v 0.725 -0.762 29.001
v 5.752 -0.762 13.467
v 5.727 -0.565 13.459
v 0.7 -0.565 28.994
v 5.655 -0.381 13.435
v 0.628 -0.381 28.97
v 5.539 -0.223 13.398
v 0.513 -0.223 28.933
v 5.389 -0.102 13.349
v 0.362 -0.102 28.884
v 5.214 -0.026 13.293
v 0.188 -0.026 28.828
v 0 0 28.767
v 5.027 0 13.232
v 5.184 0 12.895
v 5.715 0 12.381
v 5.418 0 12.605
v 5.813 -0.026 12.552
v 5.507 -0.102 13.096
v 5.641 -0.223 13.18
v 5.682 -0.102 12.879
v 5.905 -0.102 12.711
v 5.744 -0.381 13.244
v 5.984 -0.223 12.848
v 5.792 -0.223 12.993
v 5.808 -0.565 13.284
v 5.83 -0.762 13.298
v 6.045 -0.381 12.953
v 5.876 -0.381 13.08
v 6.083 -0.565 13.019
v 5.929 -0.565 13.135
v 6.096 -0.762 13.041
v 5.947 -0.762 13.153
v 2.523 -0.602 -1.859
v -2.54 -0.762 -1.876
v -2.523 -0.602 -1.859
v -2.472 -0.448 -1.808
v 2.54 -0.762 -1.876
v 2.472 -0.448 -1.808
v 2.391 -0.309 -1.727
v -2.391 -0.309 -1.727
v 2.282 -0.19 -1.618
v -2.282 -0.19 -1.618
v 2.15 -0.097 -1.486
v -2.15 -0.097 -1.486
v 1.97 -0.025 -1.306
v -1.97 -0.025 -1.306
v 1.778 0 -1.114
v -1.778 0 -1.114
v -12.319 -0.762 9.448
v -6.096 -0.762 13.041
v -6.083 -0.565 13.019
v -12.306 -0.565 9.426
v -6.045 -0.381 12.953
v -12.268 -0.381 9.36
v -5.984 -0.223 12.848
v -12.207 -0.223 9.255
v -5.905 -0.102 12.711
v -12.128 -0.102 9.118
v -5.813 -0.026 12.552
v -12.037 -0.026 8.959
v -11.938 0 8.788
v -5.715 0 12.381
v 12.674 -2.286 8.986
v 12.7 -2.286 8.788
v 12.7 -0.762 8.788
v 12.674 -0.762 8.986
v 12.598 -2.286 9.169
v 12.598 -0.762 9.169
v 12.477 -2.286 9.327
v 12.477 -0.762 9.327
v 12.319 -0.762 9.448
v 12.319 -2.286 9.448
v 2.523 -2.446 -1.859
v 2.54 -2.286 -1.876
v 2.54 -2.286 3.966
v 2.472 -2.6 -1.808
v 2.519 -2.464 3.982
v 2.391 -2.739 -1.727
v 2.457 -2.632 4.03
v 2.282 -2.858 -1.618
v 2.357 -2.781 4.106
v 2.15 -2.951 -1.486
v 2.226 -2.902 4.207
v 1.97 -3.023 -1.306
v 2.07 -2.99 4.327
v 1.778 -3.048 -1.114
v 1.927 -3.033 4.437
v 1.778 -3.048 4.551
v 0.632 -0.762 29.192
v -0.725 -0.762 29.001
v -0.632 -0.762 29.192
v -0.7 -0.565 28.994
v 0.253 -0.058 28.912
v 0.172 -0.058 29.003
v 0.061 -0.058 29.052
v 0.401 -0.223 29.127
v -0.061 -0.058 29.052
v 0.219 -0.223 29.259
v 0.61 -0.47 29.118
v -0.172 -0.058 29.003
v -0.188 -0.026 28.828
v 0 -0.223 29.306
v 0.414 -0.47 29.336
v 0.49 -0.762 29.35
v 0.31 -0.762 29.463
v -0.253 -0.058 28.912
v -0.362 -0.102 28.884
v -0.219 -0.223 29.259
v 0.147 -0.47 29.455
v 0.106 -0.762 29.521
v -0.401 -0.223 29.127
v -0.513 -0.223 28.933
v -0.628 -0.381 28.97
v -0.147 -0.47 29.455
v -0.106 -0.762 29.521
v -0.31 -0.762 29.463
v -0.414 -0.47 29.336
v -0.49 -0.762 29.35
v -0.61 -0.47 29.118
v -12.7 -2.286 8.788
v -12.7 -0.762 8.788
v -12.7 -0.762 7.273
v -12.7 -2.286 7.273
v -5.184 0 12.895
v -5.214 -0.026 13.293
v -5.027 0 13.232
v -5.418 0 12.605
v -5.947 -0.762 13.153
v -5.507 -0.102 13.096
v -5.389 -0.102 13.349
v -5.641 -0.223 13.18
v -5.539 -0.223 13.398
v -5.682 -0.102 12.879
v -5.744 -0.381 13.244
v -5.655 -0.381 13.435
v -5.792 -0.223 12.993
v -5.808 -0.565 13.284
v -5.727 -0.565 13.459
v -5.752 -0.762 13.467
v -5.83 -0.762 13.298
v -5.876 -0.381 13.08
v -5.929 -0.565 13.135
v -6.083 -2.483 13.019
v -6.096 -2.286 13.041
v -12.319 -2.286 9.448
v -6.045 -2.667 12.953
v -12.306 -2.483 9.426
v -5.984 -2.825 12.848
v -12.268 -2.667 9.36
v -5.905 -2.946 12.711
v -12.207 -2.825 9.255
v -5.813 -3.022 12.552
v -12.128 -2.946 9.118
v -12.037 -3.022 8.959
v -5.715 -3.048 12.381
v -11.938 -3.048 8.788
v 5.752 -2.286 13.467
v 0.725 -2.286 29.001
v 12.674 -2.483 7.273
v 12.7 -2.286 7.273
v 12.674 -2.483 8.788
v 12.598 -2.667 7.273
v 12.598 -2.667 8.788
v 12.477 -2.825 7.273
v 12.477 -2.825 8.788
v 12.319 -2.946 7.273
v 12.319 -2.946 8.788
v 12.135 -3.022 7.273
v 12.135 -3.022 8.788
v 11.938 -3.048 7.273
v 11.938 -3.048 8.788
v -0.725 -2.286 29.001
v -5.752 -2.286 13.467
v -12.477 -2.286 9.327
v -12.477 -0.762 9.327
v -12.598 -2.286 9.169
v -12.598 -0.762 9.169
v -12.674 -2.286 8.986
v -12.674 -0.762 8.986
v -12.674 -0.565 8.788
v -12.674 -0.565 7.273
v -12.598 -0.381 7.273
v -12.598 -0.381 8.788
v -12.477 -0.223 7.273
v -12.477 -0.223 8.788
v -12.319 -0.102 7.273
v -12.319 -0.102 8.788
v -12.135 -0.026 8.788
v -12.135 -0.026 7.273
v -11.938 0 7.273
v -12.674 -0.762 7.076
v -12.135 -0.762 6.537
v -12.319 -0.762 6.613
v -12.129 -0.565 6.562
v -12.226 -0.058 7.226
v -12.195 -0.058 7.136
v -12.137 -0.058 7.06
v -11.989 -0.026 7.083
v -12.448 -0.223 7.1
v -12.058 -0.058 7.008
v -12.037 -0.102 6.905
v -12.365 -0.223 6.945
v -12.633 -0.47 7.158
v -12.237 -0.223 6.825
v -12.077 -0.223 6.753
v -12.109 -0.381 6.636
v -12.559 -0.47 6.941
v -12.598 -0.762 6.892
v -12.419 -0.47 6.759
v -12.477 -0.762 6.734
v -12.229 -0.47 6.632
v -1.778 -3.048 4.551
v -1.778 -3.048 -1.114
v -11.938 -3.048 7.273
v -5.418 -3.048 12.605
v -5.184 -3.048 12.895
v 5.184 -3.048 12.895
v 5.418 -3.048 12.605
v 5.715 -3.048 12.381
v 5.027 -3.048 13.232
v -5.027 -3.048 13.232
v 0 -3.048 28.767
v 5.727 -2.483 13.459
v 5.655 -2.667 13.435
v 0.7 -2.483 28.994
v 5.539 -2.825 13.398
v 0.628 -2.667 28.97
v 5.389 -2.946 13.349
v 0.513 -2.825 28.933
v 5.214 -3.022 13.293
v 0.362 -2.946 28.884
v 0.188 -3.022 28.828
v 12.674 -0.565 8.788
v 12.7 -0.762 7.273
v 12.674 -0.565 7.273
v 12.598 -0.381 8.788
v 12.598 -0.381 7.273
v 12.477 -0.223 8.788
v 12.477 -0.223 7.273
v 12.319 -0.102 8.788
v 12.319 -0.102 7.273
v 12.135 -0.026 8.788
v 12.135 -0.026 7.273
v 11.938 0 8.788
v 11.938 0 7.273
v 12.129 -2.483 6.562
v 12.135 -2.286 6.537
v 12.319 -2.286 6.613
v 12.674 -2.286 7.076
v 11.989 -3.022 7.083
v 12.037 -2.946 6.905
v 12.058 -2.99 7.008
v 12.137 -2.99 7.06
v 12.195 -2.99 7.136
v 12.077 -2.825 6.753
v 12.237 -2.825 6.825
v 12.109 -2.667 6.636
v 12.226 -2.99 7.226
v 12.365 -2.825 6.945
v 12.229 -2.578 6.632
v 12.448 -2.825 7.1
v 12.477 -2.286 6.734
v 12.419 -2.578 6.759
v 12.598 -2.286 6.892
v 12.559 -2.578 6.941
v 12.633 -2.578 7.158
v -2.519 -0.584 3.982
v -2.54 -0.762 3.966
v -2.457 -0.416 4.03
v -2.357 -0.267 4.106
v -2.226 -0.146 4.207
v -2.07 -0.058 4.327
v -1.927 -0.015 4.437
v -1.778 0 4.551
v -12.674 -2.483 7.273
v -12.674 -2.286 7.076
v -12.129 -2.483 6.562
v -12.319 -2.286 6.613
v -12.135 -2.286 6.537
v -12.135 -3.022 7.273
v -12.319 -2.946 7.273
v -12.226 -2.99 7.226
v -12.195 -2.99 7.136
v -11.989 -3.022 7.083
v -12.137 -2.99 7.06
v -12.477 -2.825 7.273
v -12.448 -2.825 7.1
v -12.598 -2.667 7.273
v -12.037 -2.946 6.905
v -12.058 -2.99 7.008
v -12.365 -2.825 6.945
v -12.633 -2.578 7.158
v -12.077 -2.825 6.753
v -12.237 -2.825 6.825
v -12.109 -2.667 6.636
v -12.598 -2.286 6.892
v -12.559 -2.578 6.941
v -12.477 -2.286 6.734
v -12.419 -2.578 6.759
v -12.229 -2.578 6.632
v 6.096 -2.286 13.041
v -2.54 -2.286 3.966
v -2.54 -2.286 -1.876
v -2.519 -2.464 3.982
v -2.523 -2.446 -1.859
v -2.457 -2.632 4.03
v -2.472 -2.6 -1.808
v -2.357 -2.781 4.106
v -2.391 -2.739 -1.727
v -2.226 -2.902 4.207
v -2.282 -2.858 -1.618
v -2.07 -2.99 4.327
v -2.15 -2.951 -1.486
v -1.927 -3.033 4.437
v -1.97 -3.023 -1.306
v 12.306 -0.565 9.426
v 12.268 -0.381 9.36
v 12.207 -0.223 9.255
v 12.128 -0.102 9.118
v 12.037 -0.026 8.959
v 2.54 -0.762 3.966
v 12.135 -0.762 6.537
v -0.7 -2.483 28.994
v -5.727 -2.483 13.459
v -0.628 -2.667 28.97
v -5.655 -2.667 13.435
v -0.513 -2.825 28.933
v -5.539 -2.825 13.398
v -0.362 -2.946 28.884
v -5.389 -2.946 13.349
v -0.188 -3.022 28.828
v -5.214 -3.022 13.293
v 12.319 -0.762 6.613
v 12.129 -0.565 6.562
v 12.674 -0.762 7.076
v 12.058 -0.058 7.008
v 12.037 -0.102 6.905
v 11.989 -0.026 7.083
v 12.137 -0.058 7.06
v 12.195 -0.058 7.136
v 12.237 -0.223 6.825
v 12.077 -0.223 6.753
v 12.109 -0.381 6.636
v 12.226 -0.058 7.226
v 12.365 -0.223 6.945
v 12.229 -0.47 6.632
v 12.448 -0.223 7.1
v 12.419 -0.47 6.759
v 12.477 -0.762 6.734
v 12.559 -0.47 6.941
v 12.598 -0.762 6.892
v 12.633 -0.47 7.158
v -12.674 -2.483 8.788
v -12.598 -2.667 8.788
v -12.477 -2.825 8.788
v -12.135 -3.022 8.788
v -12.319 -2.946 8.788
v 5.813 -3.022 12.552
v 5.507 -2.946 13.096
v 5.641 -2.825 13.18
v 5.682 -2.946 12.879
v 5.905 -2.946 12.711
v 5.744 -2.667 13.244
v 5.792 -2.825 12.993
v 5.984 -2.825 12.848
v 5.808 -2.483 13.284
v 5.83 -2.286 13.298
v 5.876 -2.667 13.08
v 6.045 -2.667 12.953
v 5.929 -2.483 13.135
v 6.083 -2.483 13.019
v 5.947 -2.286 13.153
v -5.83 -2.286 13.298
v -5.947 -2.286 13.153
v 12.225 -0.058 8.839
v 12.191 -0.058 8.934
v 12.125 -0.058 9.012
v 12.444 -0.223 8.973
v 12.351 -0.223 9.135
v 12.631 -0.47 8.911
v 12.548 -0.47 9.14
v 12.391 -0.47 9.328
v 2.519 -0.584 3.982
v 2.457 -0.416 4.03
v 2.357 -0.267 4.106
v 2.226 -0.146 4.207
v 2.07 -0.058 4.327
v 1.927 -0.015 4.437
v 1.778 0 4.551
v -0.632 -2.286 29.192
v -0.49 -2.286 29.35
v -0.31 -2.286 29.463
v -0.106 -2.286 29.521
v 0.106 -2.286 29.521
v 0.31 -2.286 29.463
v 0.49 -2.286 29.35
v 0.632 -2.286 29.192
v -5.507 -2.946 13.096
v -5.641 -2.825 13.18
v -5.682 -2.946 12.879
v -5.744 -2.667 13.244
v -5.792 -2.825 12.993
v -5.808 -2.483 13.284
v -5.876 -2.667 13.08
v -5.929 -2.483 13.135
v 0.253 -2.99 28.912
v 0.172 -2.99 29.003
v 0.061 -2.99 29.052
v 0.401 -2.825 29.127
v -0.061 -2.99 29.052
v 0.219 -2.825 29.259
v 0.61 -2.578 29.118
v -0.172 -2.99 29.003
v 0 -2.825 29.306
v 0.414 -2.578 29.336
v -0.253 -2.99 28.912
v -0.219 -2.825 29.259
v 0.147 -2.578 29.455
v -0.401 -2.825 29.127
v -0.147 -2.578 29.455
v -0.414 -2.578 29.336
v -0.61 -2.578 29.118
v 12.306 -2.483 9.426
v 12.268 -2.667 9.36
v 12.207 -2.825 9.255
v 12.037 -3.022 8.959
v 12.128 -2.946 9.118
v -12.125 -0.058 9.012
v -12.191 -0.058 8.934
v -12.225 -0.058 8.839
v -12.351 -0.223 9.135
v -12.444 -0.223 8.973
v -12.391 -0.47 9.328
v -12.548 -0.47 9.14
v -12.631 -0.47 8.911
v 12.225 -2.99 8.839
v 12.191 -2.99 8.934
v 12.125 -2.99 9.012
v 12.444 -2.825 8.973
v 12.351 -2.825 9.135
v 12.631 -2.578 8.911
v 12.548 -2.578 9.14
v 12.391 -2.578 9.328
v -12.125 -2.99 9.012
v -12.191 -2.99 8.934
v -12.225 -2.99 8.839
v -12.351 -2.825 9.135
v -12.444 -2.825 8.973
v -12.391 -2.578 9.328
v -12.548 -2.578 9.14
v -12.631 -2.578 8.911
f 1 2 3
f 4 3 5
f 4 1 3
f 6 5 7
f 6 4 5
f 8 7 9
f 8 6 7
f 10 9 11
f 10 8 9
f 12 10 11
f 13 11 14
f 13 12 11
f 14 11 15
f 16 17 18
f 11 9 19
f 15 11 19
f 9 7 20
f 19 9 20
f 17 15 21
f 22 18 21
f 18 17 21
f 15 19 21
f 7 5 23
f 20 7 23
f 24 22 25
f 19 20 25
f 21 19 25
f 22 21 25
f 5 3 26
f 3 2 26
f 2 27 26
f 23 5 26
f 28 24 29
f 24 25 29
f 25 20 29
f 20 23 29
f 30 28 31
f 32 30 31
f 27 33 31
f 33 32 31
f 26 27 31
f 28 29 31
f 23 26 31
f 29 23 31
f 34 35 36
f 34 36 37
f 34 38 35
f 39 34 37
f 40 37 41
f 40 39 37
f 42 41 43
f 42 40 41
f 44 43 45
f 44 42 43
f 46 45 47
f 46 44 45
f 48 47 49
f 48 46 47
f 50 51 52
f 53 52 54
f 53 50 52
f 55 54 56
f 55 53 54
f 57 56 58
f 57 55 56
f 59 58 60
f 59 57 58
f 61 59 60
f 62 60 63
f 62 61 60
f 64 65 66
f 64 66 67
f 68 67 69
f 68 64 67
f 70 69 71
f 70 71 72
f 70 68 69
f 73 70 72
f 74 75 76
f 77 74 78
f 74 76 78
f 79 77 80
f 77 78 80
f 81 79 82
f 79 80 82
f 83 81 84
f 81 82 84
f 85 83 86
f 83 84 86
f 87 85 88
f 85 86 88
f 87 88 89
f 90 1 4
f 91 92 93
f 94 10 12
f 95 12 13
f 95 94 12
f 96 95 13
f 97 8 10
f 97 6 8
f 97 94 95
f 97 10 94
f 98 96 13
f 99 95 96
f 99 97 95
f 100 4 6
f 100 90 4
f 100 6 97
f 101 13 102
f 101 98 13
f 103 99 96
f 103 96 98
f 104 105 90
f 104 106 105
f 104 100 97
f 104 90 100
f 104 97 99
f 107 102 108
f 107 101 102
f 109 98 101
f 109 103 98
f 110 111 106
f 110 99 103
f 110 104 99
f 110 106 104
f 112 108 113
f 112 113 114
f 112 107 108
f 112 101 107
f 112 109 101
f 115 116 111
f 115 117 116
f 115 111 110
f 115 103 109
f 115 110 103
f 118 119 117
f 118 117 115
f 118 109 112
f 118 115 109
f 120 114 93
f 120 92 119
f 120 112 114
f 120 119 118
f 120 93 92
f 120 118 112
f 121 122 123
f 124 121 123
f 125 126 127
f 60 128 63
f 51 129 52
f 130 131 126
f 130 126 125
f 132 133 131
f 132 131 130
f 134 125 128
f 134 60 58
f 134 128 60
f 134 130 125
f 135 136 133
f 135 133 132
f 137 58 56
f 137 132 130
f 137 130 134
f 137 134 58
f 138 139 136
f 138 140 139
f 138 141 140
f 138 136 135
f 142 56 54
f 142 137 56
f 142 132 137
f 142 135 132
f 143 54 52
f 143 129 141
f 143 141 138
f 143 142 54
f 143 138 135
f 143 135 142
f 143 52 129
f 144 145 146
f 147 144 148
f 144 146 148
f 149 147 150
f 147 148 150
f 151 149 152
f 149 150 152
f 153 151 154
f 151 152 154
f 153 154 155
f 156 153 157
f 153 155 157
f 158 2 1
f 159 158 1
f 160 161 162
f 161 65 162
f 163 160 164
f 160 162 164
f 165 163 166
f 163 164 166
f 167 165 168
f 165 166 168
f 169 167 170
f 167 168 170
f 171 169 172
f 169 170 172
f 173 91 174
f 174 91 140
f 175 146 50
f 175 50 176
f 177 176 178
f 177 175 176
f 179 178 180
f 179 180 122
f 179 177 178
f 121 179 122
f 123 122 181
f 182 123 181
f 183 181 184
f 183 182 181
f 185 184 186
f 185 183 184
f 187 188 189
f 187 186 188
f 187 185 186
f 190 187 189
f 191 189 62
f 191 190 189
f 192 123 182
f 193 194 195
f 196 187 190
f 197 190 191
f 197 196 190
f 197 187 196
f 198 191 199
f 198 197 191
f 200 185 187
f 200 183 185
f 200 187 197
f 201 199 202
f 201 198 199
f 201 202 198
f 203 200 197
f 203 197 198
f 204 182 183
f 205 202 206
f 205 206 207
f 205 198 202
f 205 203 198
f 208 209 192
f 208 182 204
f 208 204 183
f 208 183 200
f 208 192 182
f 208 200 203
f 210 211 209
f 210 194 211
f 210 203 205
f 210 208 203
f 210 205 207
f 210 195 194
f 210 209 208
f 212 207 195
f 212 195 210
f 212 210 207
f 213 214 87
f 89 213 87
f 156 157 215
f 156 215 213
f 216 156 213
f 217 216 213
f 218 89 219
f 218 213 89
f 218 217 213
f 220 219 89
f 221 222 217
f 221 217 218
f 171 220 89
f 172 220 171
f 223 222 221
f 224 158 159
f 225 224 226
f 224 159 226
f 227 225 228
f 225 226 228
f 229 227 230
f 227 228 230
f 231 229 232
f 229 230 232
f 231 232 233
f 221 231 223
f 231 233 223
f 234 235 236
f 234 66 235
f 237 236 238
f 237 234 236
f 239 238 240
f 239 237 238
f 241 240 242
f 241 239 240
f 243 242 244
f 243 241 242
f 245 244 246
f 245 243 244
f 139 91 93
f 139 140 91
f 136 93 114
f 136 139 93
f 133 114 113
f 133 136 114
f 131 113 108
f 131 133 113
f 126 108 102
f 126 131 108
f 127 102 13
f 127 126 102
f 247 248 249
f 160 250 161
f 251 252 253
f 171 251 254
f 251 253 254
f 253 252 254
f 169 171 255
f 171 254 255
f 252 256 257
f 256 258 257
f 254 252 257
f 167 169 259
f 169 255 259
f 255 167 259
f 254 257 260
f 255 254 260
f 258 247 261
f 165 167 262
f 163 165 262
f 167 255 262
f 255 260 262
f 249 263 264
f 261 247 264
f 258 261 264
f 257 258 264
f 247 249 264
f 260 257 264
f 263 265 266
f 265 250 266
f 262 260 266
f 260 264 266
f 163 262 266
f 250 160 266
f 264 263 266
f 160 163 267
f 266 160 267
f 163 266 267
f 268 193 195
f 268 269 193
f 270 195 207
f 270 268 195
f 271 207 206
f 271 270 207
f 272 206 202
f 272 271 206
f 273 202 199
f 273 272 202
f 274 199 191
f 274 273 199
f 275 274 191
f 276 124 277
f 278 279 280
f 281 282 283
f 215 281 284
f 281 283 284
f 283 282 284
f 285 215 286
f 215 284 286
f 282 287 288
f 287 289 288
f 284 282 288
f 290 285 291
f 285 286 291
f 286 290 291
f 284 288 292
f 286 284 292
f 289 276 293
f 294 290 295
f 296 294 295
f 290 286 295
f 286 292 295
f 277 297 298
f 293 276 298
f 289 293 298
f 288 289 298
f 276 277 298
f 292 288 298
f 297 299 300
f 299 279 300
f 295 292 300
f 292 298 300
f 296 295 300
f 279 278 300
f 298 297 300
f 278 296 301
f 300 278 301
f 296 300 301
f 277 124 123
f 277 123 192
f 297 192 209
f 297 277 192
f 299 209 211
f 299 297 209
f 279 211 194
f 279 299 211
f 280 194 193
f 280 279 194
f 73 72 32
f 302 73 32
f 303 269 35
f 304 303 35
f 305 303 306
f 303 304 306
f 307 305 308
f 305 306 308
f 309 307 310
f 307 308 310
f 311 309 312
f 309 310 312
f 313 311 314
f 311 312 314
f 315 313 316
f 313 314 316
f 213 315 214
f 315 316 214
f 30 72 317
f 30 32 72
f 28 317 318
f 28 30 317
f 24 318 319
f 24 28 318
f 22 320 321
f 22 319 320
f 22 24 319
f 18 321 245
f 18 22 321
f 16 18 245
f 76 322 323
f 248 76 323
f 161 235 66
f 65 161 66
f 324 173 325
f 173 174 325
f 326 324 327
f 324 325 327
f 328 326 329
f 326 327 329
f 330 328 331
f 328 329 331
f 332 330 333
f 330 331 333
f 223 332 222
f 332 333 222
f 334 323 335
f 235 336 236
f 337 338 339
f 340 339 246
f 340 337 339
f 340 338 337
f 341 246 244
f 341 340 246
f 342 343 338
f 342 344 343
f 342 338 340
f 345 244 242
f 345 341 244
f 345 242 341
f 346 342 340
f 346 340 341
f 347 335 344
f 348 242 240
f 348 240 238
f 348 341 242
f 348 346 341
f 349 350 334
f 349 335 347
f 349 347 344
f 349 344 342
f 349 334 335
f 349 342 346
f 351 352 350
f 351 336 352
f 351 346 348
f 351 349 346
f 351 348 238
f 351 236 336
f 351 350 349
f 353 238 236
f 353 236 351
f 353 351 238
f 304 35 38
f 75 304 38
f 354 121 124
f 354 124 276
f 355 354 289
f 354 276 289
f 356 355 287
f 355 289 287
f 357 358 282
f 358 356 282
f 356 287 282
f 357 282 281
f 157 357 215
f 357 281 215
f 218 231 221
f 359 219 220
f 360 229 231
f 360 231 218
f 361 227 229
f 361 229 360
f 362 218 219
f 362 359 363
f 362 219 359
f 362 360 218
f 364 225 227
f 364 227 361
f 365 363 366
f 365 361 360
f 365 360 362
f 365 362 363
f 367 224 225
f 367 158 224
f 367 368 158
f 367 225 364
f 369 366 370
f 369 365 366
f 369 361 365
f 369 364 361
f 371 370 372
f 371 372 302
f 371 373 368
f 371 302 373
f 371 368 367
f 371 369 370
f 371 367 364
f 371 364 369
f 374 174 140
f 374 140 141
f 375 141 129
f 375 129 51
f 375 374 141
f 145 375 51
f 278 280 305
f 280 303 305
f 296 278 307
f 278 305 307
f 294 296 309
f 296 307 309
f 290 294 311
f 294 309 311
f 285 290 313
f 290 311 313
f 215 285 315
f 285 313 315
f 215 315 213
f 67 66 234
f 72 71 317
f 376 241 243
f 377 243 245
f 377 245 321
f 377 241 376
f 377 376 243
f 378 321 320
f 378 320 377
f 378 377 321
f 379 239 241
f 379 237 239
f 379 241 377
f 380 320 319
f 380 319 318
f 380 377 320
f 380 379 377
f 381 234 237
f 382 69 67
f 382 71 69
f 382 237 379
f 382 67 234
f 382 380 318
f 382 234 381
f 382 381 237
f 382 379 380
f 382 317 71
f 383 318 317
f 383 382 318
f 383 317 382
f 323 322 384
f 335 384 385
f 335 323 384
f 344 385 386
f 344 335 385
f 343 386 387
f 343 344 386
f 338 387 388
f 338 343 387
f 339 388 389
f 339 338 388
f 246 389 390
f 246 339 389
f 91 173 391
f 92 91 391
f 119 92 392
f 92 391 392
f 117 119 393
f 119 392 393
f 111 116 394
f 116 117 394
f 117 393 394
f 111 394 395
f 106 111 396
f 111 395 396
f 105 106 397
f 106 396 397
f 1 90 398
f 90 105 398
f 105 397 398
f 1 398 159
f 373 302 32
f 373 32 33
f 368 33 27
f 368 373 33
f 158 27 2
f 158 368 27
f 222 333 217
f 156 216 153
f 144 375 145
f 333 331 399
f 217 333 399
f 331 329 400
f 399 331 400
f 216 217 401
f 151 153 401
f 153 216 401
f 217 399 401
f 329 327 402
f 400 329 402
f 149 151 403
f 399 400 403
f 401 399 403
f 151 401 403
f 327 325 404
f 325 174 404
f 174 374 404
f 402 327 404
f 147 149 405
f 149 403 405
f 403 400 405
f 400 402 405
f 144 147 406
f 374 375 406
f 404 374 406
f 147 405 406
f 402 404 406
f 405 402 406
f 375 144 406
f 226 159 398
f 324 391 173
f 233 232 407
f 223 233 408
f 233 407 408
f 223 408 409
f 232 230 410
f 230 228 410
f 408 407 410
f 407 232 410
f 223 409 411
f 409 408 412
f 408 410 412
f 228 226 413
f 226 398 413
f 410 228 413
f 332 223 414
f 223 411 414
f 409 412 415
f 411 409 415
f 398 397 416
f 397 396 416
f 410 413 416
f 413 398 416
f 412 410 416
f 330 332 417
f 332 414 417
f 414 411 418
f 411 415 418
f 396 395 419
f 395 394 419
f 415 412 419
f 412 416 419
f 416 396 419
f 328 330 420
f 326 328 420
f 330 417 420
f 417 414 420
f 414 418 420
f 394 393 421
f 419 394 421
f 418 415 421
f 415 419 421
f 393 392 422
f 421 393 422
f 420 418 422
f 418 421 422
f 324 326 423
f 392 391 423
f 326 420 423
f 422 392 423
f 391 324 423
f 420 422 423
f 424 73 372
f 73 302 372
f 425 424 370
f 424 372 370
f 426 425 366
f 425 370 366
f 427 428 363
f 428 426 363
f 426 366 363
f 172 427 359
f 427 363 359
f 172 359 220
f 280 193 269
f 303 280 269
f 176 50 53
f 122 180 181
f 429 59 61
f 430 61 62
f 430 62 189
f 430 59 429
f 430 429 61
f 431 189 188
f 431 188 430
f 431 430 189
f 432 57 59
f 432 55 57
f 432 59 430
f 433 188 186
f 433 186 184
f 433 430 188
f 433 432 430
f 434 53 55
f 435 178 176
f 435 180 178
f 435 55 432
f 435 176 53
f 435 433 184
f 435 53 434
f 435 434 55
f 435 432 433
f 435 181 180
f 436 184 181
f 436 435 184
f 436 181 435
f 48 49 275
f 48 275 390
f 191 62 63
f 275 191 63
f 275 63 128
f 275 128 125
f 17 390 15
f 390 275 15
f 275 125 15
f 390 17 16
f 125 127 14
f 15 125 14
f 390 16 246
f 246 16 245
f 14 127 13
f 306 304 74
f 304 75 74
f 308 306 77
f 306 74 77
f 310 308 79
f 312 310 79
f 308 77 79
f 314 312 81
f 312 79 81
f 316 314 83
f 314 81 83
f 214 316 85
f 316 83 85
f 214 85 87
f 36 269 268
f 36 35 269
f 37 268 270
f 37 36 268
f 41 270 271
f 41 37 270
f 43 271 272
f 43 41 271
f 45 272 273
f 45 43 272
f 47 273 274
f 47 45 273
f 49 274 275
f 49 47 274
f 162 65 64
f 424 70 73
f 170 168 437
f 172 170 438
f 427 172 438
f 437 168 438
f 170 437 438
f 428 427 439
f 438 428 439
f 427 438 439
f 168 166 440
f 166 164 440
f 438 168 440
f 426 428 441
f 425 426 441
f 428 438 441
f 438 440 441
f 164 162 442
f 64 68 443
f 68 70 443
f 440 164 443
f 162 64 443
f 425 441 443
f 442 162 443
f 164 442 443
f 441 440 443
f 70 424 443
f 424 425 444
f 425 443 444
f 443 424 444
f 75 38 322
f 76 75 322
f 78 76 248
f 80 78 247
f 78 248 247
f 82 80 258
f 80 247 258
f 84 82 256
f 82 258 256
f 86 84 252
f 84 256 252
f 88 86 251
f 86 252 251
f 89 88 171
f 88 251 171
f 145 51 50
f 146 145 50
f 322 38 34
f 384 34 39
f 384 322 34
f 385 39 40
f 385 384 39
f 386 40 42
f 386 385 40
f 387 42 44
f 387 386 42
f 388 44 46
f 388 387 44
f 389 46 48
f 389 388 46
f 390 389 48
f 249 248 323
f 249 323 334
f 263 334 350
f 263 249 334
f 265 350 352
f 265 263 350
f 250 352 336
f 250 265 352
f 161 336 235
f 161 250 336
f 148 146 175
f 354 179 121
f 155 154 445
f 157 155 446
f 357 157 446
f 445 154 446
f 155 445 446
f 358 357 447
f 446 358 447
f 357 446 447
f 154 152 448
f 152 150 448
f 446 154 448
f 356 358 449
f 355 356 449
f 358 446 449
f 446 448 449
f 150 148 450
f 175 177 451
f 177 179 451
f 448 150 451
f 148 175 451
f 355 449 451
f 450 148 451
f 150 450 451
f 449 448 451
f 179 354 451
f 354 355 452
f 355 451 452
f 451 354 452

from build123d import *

# Parameters (mm, degrees)
F1_DEPTH = 3.048
F2_R     = 0.762


with BuildPart() as f1:
    # F0 (on Front) → F1 (new body)
    with BuildSketch(Plane.XZ):
        Polygon((0, 31.242), (-5.842, 13.187891), (-12.7, 9.228423), (-12.7, 6.688423), (-2.54, 3.966059), (-2.54, -1.875941), (2.54, -1.875941), (2.54, 3.966059), (12.7, 6.688423), (12.7, 9.228423), (5.842, 13.187891), align=None)
    extrude(amount=F1_DEPTH)

    # F2
    f2_edges = [f1.edges().sort_by_distance(p)[0] for p in [
        (0, -1.524, 31.242),
        (5.842, -1.524, 13.187891),
        (12.7, -1.524, 9.228423),
        (12.7, -1.524, 6.688423),
        (-5.842, -1.524, 13.187891),
        (-12.7, -1.524, 9.228423),
        (-12.7, -1.524, 6.688423),
        (2.54, 0, 1.045059),
        (2.54, -3.048, 1.045059),
        (-2.54, -3.048, 1.045059),
        (-2.54, 0, 1.045059),
        (2.921, -3.048, 22.214946),
        (-2.921, -3.048, 22.214946),
        (-9.271, -3.048, 11.208157),
        (-12.7, -3.048, 7.958423),
        (-7.62, -3.048, 5.327241),
        (0, -3.048, -1.875941),
        (7.62, -3.048, 5.327241),
        (12.7, -3.048, 7.958423),
        (9.271, -3.048, 11.208157),
        (2.921, 0, 22.214946),
        (-2.921, 0, 22.214946),
        (-9.271, 0, 11.208157),
        (-12.7, 0, 7.958423),
        (-7.62, 0, 5.327241),
        (0, 0, -1.875941),
        (7.62, 0, 5.327241),
        (12.7, 0, 7.958423),
        (9.271, 0, 11.208157),
    ]]
    fillet(f2_edges, radius=F2_R)


solid = f1.part
